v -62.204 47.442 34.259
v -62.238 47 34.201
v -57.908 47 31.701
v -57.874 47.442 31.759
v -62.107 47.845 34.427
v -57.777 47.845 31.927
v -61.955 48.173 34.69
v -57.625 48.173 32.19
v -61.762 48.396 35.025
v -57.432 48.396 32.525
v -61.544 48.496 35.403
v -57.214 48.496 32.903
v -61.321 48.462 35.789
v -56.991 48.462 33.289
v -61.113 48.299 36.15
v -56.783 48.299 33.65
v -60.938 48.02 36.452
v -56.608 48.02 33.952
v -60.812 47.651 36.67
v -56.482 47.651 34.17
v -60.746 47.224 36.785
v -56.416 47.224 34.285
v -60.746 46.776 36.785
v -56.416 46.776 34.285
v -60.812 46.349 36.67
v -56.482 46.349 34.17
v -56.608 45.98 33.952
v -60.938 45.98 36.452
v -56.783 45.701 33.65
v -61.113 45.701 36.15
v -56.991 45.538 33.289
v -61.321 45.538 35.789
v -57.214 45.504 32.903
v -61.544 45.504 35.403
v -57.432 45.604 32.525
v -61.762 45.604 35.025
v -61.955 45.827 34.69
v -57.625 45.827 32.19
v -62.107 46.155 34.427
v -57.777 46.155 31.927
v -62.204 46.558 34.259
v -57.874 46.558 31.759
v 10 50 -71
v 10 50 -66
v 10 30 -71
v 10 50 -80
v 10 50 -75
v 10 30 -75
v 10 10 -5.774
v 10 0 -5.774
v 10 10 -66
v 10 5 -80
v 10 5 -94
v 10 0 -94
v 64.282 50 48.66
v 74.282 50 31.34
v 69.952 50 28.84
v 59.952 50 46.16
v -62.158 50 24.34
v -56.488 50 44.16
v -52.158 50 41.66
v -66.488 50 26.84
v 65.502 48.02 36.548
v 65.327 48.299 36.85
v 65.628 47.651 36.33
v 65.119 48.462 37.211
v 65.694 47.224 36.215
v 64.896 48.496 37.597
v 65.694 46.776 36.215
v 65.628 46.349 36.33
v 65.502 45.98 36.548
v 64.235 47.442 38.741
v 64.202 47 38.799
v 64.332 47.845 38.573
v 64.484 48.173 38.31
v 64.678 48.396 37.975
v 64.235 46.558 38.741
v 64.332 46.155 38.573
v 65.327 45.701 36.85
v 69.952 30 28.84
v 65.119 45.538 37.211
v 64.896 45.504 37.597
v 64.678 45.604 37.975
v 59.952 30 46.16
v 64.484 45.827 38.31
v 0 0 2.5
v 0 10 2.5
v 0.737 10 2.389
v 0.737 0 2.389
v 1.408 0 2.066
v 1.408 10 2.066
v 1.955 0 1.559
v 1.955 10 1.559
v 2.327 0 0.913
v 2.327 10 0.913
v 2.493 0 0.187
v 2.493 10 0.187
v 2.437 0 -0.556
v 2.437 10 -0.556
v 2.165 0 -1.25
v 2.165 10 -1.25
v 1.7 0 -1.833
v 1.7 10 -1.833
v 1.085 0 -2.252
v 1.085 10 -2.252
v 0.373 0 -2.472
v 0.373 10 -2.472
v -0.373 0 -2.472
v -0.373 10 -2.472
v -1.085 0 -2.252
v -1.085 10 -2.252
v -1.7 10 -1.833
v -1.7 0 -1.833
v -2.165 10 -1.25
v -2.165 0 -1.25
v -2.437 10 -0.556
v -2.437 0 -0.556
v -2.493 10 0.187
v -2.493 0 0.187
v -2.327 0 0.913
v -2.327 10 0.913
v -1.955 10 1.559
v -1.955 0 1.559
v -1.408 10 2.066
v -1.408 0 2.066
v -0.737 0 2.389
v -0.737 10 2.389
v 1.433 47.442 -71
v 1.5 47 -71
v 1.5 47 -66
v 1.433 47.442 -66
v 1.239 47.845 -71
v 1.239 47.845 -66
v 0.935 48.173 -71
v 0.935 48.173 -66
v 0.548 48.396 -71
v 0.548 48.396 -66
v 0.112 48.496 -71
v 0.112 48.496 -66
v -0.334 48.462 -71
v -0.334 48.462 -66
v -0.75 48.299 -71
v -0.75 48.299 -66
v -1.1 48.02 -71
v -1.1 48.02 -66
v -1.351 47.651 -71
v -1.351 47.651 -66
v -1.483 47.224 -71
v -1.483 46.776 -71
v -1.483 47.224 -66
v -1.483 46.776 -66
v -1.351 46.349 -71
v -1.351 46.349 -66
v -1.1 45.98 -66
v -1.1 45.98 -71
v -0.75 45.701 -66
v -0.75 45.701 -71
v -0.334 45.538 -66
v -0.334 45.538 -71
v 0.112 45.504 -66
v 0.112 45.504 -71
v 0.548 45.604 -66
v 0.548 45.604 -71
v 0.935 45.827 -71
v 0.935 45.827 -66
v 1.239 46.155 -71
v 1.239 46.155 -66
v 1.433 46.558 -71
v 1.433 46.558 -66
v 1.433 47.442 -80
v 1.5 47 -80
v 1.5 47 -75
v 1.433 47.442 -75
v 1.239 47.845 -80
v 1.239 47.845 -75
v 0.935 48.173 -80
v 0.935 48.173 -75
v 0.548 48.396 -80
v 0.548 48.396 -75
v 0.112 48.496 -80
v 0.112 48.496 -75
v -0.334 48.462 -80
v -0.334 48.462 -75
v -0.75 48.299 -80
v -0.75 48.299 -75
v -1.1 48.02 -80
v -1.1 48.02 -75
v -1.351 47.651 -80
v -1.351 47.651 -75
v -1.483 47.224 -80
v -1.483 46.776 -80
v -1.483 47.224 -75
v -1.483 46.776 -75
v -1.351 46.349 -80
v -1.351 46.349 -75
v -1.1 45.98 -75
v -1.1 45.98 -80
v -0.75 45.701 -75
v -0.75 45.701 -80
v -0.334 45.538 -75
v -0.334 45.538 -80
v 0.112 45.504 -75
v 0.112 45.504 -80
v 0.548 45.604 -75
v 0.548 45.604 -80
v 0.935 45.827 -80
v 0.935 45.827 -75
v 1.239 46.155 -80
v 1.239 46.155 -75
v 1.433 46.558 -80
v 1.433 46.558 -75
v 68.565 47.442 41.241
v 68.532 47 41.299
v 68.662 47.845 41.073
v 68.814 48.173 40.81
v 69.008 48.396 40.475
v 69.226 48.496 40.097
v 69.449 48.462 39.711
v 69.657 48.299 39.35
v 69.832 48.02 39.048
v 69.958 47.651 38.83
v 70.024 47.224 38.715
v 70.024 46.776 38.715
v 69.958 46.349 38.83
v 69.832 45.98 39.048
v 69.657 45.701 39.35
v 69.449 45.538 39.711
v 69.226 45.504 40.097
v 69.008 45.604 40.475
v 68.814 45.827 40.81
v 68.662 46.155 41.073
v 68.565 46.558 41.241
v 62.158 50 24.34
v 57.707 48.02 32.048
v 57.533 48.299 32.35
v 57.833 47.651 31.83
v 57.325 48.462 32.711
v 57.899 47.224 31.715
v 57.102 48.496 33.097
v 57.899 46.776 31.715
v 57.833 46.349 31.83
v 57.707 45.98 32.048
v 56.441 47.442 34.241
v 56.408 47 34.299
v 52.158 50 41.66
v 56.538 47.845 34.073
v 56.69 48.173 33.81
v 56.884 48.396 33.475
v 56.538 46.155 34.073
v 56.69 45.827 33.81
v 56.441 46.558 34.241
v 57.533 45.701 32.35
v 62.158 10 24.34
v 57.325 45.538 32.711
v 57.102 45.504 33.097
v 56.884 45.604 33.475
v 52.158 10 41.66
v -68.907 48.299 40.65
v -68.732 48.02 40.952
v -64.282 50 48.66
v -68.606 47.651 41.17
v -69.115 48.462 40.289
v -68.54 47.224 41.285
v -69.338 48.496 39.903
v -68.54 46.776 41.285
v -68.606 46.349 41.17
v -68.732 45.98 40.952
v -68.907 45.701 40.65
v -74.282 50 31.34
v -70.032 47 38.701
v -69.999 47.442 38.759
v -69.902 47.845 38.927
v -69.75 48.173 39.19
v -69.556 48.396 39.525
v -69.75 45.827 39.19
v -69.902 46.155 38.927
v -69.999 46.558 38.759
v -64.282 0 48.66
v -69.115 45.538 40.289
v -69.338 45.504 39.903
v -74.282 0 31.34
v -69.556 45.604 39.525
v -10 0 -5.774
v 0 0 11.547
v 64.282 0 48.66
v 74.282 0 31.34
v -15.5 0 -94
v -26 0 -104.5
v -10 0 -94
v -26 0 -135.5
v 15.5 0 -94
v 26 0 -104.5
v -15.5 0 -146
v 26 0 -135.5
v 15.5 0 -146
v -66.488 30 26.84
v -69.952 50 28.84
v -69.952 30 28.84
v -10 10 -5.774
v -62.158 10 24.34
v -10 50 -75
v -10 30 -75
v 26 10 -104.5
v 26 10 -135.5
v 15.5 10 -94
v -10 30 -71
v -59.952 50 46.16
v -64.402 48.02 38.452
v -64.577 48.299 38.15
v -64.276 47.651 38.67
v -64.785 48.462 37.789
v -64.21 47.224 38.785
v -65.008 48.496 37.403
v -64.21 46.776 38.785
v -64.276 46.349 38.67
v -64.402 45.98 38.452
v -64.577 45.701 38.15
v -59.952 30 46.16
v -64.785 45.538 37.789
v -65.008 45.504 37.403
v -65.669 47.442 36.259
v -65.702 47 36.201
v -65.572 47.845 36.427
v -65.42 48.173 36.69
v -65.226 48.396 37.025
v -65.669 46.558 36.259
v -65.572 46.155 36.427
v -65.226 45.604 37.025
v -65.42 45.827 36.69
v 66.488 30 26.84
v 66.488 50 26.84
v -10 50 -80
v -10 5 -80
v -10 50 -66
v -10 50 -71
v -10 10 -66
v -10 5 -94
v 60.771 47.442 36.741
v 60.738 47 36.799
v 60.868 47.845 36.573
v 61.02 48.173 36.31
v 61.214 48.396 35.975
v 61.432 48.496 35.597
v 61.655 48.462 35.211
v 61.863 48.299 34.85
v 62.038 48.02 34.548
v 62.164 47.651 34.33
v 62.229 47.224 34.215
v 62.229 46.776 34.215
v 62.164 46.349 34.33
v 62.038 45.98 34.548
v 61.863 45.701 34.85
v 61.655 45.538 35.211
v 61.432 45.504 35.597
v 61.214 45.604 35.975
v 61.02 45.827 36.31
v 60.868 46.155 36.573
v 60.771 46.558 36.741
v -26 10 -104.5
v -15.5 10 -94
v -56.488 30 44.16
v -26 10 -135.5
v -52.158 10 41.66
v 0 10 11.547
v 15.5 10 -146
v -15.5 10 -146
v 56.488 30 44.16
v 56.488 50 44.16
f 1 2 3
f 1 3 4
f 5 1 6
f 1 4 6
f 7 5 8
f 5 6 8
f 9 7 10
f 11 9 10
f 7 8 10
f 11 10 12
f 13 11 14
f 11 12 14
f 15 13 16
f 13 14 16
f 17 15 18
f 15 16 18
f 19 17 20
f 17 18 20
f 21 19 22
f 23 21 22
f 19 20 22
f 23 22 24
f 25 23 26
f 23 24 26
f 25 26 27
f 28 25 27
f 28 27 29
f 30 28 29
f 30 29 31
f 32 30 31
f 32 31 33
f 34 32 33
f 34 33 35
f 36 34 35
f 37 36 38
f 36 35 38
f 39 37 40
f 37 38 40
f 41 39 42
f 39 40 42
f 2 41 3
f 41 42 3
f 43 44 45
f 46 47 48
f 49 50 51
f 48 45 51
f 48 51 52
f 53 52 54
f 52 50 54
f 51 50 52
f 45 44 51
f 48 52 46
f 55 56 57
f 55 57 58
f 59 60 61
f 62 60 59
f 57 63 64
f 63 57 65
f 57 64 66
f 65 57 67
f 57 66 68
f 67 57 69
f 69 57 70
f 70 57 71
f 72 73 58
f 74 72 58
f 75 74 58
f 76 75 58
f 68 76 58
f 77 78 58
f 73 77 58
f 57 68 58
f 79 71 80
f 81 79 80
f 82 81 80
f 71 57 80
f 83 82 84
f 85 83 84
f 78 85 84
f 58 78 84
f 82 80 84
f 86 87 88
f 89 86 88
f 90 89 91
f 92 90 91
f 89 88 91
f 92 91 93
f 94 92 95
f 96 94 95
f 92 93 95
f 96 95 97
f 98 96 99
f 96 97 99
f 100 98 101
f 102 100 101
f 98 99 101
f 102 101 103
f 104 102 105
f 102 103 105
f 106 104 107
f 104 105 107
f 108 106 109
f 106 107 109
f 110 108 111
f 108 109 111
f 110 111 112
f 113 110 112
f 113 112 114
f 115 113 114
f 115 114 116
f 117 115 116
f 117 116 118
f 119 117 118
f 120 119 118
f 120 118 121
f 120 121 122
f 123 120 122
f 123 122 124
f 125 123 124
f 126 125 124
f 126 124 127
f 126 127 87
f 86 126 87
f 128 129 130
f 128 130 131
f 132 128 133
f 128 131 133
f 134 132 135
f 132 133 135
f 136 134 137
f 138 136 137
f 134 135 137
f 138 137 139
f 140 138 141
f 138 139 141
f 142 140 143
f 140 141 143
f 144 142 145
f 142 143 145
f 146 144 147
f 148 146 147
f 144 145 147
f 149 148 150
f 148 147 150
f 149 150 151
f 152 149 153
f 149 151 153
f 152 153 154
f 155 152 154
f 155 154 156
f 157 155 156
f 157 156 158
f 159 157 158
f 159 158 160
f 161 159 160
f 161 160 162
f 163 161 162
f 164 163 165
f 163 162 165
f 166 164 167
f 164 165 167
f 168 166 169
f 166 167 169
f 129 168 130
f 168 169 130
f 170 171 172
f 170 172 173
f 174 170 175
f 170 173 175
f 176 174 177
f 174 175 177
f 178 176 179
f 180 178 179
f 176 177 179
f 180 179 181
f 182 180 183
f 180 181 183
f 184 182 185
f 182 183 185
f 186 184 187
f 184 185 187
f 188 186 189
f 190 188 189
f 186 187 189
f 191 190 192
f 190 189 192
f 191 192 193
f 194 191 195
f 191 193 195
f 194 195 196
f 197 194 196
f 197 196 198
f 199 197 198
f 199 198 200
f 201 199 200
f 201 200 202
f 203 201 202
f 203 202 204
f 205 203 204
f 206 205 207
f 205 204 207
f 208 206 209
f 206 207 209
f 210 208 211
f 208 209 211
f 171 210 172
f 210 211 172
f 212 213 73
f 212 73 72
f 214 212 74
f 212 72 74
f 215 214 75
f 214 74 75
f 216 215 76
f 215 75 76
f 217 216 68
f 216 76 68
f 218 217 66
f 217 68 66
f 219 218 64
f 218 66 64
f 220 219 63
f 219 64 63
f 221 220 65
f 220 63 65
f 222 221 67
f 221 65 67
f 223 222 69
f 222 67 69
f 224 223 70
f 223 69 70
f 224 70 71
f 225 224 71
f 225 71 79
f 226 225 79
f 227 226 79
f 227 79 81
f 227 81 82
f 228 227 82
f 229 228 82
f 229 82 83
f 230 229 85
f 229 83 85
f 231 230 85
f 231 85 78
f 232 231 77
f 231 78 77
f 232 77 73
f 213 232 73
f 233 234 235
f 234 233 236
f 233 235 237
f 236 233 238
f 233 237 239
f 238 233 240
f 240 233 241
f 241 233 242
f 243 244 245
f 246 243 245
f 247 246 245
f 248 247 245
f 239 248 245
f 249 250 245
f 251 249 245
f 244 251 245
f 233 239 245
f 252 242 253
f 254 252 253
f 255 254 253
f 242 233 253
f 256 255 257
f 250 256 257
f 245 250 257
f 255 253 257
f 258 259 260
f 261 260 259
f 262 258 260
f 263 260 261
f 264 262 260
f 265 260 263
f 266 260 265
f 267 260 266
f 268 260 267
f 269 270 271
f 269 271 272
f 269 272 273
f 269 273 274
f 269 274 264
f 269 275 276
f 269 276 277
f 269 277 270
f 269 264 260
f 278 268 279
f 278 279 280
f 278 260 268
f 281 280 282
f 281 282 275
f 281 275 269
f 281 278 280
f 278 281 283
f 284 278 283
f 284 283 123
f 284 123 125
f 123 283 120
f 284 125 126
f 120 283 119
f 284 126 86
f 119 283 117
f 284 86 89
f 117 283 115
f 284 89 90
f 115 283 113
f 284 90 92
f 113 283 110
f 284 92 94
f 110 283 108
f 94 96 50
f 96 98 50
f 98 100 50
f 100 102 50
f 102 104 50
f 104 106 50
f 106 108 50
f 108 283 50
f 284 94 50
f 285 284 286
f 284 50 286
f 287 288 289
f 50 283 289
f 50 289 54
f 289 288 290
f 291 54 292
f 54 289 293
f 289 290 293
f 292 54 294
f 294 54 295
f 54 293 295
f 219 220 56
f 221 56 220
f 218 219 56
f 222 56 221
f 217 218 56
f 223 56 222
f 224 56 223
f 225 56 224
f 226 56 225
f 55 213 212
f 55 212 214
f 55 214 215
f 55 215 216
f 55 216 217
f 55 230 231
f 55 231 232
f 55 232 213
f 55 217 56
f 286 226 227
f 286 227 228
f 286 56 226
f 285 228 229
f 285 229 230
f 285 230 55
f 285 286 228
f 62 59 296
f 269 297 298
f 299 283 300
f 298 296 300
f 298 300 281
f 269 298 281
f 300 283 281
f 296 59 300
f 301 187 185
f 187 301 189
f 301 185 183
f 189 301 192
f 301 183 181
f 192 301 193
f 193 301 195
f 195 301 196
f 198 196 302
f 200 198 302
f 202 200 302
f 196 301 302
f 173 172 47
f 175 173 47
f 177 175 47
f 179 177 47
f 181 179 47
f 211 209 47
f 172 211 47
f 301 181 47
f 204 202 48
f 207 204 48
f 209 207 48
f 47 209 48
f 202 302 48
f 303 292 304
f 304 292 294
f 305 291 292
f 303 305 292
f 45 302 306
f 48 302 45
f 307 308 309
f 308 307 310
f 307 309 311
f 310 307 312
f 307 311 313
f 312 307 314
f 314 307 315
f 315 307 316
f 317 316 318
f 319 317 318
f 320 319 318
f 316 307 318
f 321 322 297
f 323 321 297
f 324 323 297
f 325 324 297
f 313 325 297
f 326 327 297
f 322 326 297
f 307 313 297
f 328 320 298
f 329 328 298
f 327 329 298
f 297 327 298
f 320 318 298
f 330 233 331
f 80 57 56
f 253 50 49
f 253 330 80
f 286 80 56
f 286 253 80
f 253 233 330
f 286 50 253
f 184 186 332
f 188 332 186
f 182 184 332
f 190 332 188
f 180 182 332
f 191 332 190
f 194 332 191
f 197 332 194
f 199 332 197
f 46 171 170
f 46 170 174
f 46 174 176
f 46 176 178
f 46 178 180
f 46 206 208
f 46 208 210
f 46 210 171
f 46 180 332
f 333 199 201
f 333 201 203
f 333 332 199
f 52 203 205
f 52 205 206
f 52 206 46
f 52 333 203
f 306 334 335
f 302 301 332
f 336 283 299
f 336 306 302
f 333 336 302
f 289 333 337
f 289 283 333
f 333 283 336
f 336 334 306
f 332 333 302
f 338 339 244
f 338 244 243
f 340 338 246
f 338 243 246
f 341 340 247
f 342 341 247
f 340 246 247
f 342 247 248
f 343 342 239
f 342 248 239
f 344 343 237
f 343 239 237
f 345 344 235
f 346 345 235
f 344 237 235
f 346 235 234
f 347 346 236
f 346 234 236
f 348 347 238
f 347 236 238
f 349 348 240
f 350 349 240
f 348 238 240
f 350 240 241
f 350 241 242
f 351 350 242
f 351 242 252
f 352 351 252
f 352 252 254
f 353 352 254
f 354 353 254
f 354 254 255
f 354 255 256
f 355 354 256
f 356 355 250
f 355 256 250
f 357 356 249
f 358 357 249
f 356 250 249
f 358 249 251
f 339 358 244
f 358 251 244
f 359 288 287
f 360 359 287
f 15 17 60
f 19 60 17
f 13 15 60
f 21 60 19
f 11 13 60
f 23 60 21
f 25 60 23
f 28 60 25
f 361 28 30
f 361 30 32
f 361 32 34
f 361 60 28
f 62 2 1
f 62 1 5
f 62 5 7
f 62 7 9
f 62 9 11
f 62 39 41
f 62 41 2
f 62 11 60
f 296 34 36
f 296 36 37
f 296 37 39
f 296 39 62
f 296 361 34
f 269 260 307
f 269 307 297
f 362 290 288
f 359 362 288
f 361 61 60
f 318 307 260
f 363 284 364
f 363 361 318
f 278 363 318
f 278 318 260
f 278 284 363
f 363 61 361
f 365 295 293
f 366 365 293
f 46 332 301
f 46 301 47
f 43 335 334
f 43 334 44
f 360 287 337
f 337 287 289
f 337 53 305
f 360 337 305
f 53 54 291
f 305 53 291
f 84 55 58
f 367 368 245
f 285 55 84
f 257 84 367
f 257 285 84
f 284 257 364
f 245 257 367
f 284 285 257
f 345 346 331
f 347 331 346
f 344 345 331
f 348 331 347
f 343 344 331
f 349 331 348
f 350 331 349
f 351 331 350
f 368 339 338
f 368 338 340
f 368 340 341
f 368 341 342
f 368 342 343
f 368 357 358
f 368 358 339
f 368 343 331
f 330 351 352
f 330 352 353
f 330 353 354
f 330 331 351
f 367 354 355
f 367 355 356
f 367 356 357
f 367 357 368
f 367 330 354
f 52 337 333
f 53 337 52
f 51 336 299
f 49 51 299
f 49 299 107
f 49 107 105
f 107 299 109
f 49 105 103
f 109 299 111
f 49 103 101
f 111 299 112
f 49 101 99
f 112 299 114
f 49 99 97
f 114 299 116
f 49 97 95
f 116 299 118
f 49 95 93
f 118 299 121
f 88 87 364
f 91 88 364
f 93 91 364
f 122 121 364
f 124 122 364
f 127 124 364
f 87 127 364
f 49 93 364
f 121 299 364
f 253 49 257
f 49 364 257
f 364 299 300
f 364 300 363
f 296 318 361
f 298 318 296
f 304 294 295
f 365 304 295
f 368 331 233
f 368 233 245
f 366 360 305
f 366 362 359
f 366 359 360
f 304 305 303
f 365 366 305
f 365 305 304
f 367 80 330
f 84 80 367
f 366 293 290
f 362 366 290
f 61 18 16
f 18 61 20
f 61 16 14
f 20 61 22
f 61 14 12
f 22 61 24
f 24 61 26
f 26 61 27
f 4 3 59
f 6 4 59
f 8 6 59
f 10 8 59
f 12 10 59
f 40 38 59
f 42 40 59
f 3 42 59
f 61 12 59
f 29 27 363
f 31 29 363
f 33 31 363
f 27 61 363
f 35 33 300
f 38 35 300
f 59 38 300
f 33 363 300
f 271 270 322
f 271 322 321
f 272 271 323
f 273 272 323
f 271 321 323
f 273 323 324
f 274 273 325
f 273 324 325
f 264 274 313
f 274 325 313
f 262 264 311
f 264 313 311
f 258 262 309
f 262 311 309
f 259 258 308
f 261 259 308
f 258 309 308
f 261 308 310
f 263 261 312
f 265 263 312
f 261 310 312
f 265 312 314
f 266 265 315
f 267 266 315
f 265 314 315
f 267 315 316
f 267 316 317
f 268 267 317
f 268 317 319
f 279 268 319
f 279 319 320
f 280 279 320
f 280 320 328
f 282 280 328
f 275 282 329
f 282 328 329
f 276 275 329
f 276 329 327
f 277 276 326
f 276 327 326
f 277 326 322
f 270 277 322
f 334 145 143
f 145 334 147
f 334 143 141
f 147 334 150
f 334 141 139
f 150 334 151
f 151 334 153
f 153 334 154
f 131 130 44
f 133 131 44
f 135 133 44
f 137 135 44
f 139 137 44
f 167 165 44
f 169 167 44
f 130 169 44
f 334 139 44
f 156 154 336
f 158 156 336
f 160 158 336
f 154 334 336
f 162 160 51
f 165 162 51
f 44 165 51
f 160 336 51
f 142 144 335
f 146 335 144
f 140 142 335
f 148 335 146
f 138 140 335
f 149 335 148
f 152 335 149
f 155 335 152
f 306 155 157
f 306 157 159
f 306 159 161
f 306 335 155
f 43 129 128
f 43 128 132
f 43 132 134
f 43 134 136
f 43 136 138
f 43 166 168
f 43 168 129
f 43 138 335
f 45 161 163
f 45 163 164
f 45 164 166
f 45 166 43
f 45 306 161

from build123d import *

# Parameters (mm, degrees)
BOSS_EXTRUDE1_DEPTH = 10
SKETCH2_W           = 20
SKETCH2_H           = 14
BOSS_EXTRUDE2_DEPTH = 20
SKETCH3_W           = 20
SKETCH3_H           = 5
BOSS_EXTRUDE3_DEPTH = 20
SKETCH4_R           = 1.5
CUT_EXTRUDE1_DEPTH  = 84.402637848
CIRPATTERN1_COUNT   = 3
SKETCH5_R           = 2.5
CUT_EXTRUDE2_DEPTH  = 117.266161556
SKETCH8_W           = 20
SKETCH8_H           = 14
BOSS_EXTRUDE7_DEPTH = 5
BOSS_EXTRUDE8_DEPTH = 10


with BuildPart() as part:
    # Sketch1 → Boss-Extrude1 (new body)
    with BuildSketch(Plane(origin=(0, 0, 0), x_dir=(1, 0, 0), z_dir=(0, 1, 0))):
        Polygon((0, 0), (-10, 5.773502692), (-10, 80), (10, 80), (10, 5.773502692), align=None)
    boss_extrude1 = extrude(amount=BOSS_EXTRUDE1_DEPTH)

    # Sketch2 → Boss-Extrude2 (add)
    with BuildSketch(Plane(origin=(0, 10, 0), x_dir=(1, 0, 0), z_dir=(0, 1, 0))):
        with Locations((0, 73)):
            Rectangle(SKETCH2_W, SKETCH2_H)
    boss_extrude2 = extrude(amount=BOSS_EXTRUDE2_DEPTH)

    # Sketch3 → Boss-Extrude3 (add)
    with BuildSketch(Plane(origin=(0, 30, 0), x_dir=(1, 0, 0), z_dir=(0, 1, 0))):
        with Locations((0, 77.5)):
            Rectangle(SKETCH3_W, SKETCH3_H)
        with Locations((0, 68.5)):
            Rectangle(SKETCH3_W, SKETCH3_H)
    boss_extrude3 = extrude(amount=BOSS_EXTRUDE3_DEPTH)

    # Sketch4 → Cut-Extrude1 (cut, symmetric)
    with BuildSketch(Plane.XY.offset(-66)):
        with Locations((0, 47)):
            Circle(SKETCH4_R)
    cut_extrude1 = extrude(amount=CUT_EXTRUDE1_DEPTH, both=True, mode=Mode.SUBTRACT)

    # CirPattern1: Boss-Extrude1, Boss-Extrude2, Boss-Extrude3, Cut-Extrude1 ×3 about axis
    cirpattern1_axis = Axis((0, 0, 0), (0, 1, 0))
    add([boss_extrude1.rotate(cirpattern1_axis, i * 360 / CIRPATTERN1_COUNT) for i in range(1, CIRPATTERN1_COUNT)])
    add([boss_extrude2.rotate(cirpattern1_axis, i * 360 / CIRPATTERN1_COUNT) for i in range(1, CIRPATTERN1_COUNT)])
    add([boss_extrude3.rotate(cirpattern1_axis, i * 360 / CIRPATTERN1_COUNT) for i in range(1, CIRPATTERN1_COUNT)])
    add([cut_extrude1.rotate(cirpattern1_axis, i * 360 / CIRPATTERN1_COUNT) for i in range(1, CIRPATTERN1_COUNT)], mode=Mode.SUBTRACT)

    # Sketch5 → Cut-Extrude2 (cut, through all)
    with BuildSketch(Plane(origin=(0, 10, 0), x_dir=(1, 0, 0), z_dir=(0, 1, 0))):
        with Locations(Location((0, 0, 0), (0, 0, 270))):
            Circle(SKETCH5_R)
    extrude(amount=-CUT_EXTRUDE2_DEPTH, mode=Mode.SUBTRACT)

    # Sketch8 → Boss-Extrude7 (add)
    with BuildSketch(Plane(origin=(0, 0, 0), x_dir=(1, 0, 0), z_dir=(0, 1, 0))):
        with Locations((0, 87)):
            Rectangle(SKETCH8_W, SKETCH8_H)
    extrude(amount=BOSS_EXTRUDE7_DEPTH)

    # Sketch11 → Boss-Extrude8 (add)
    with BuildSketch(Plane(origin=(0, 0, 0), x_dir=(1, 0, 0), z_dir=(0, 1, 0))):
        Polygon((-15.5, 94), (15.5, 94), (26, 104.5), (26, 135.5), (15.5, 146), (-15.5, 146), (-26, 135.5), (-26, 104.5), align=None)
    extrude(amount=BOSS_EXTRUDE8_DEPTH)


solid = part.part
